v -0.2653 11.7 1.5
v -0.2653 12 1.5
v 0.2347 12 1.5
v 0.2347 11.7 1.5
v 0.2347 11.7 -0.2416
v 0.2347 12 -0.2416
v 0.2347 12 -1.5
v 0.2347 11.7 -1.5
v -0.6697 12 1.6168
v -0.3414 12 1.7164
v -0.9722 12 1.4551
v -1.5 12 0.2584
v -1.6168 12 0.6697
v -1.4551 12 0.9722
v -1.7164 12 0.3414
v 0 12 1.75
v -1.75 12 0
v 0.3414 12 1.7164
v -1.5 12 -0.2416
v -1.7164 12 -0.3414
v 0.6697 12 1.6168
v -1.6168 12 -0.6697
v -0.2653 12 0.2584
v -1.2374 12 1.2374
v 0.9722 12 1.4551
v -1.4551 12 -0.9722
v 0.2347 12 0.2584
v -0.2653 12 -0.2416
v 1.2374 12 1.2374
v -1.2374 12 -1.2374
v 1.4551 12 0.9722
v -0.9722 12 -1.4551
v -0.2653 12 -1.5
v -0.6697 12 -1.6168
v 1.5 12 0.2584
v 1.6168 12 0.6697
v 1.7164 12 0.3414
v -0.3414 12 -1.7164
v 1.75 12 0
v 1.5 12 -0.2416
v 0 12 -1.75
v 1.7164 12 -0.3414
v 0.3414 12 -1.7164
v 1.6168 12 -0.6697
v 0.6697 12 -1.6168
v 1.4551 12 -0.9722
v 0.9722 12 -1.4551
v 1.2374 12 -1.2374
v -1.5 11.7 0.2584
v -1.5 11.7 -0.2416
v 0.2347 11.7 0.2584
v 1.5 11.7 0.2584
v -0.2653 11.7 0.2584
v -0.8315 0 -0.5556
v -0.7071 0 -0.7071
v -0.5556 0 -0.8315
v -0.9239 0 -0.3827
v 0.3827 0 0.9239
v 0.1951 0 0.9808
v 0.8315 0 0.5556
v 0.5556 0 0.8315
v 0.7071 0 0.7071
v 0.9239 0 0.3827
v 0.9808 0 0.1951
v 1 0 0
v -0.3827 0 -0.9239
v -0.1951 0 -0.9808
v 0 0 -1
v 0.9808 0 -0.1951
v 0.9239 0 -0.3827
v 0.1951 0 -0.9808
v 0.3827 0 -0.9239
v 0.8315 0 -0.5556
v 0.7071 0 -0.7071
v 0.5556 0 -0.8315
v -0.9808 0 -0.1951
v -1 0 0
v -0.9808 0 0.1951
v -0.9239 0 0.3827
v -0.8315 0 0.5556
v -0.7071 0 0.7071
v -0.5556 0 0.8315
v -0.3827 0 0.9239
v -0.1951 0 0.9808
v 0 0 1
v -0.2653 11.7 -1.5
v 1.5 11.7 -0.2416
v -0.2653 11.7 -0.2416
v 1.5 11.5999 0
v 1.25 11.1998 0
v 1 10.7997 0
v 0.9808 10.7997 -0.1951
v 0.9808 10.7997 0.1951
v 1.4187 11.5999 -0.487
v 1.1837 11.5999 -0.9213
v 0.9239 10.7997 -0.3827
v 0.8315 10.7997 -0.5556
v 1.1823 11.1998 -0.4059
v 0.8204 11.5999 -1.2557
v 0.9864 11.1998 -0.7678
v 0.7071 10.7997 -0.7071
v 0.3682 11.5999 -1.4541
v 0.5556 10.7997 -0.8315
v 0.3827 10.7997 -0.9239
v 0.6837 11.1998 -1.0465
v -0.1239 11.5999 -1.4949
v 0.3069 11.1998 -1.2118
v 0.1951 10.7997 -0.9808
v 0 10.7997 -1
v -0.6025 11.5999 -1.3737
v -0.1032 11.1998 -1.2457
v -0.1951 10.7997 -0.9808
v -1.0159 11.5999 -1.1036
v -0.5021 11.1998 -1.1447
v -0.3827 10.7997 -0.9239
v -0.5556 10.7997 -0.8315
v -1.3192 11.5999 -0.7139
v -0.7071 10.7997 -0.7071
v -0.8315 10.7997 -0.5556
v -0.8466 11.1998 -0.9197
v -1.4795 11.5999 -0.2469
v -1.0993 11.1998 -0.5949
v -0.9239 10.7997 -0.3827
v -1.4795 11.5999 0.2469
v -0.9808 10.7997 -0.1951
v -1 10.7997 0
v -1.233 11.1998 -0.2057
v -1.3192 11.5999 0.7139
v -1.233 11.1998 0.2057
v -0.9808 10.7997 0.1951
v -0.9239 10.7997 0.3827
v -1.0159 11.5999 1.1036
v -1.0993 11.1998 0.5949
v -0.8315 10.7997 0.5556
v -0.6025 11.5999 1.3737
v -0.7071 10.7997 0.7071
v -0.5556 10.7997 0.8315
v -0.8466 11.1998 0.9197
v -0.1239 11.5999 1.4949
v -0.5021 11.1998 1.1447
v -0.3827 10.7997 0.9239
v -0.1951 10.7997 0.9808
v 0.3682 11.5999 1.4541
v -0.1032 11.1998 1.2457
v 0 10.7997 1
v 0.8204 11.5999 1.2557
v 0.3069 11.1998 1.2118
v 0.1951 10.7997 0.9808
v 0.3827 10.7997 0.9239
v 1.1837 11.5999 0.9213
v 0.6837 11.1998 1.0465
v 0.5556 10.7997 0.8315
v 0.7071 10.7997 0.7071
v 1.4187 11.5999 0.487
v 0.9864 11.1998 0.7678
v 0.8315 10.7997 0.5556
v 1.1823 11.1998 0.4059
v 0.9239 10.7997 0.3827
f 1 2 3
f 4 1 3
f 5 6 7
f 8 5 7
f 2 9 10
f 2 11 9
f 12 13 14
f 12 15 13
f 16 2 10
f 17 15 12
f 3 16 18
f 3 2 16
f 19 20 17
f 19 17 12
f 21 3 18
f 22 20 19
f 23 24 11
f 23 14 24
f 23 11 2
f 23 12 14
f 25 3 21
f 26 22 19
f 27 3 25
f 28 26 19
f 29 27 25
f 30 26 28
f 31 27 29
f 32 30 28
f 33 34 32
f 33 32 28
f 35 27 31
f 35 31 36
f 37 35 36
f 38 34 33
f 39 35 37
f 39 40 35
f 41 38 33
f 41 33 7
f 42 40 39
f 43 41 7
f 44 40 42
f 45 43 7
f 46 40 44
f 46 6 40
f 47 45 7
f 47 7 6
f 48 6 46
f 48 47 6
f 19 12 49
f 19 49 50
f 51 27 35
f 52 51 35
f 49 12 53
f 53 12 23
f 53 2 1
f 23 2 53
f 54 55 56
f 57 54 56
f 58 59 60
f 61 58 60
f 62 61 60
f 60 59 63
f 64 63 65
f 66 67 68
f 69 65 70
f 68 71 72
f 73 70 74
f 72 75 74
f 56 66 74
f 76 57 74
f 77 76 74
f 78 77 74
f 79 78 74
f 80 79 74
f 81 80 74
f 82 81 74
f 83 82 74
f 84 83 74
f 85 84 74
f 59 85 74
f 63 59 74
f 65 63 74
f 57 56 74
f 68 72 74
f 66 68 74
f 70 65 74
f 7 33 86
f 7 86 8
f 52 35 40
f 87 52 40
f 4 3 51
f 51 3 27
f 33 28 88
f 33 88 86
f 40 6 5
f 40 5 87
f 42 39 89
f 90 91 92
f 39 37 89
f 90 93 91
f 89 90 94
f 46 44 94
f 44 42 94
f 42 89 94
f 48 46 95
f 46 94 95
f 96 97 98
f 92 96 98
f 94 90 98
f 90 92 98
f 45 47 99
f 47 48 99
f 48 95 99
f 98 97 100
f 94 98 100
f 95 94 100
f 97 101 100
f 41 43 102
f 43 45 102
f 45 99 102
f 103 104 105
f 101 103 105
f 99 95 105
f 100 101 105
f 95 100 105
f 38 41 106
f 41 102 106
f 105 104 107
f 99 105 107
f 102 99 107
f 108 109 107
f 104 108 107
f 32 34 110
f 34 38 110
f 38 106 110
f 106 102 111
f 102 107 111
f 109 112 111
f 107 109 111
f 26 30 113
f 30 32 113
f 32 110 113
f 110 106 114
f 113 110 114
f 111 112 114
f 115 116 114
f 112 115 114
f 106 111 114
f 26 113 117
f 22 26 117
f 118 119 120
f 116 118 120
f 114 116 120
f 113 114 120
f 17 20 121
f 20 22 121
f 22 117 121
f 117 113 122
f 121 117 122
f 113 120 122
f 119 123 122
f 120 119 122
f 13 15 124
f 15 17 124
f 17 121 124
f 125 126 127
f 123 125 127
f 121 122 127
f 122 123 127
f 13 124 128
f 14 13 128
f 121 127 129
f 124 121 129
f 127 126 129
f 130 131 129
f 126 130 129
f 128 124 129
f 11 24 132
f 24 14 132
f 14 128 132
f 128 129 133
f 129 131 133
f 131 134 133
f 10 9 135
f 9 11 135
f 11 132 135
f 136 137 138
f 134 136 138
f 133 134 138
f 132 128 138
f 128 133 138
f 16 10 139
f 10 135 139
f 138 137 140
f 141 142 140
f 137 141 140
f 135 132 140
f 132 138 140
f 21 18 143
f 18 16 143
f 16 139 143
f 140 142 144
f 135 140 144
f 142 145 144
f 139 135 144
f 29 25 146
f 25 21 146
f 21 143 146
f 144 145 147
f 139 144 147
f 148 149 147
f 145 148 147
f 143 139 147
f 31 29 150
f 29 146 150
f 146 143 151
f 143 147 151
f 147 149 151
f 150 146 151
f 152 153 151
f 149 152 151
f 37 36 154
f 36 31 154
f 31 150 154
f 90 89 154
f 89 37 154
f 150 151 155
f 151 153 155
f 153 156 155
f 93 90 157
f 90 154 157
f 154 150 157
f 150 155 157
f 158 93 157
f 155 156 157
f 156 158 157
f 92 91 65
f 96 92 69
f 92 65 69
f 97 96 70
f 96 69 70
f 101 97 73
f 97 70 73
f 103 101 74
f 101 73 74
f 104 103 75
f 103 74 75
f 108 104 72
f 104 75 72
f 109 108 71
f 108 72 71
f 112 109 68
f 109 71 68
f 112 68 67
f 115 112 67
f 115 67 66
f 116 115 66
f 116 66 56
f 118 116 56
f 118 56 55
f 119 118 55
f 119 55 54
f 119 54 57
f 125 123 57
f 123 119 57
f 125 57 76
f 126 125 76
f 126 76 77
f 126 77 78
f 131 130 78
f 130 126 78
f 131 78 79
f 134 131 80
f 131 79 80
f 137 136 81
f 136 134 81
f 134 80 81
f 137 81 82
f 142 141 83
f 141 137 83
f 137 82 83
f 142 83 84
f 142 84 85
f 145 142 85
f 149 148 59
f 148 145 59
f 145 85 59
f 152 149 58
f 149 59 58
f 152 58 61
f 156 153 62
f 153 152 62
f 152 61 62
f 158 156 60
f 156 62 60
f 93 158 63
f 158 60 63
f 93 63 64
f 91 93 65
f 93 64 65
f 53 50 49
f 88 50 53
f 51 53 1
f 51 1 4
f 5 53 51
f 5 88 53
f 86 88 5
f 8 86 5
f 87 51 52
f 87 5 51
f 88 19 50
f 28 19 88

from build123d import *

# Parameters (mm, degrees)
SKETCH1_R           = 1
BOSS_EXTRUDE1_DEPTH = 12
SKETCH2_R           = 1.75
BOSS_EXTRUDE2_DEPTH = 1.3
BOSS_EXTRUDE2_TAPER = 32
SKETCH3_W           = 0.5
SKETCH3_H           = 1.258378485
SKETCH3_H_2         = 1.241621515
SKETCH3_W_2         = 1.234727157
SKETCH3_H_3         = 0.5
SKETCH3_W_3         = 1.265272843
CUT_EXTRUDE1_DEPTH  = 0.3


with BuildPart() as part:
    # Sketch1 → Boss-Extrude1 (new body)
    with BuildSketch(Plane(origin=(0, 0, 0), x_dir=(1, 0, 0), z_dir=(0, 1, 0))):
        Circle(SKETCH1_R)
    extrude(amount=BOSS_EXTRUDE1_DEPTH)

    # Sketch2 → Boss-Extrude2 (add)
    with BuildSketch(Plane(origin=(0, 12, 0), x_dir=(1, 0, 0), z_dir=(0, 1, 0))):
        Circle(SKETCH2_R)
    extrude(amount=-BOSS_EXTRUDE2_DEPTH, taper=BOSS_EXTRUDE2_TAPER)

    # Sketch3 → Cut-Extrude1 (cut)
    with BuildSketch(Plane(origin=(0, 12, 0), x_dir=(1, 0, 0), z_dir=(0, 1, 0))):
        with Locations((-0.015272843, 0.870810758)):
            Rectangle(SKETCH3_W, SKETCH3_H)
        with Locations((-0.015272843, -0.879189242)):
            Rectangle(SKETCH3_W, SKETCH3_H_2)
        with Locations((-0.882636421, -0.008378485)):
            Rectangle(SKETCH3_W_2, SKETCH3_H_3)
        with Locations((0.867363579, -0.008378485)):
            Rectangle(SKETCH3_W_3, SKETCH3_H_3)
        with Locations((-0.015272843, -0.008378485)):
            Rectangle(SKETCH3_W, SKETCH3_H_3)
    extrude(amount=-CUT_EXTRUDE1_DEPTH, mode=Mode.SUBTRACT)


solid = part.part
